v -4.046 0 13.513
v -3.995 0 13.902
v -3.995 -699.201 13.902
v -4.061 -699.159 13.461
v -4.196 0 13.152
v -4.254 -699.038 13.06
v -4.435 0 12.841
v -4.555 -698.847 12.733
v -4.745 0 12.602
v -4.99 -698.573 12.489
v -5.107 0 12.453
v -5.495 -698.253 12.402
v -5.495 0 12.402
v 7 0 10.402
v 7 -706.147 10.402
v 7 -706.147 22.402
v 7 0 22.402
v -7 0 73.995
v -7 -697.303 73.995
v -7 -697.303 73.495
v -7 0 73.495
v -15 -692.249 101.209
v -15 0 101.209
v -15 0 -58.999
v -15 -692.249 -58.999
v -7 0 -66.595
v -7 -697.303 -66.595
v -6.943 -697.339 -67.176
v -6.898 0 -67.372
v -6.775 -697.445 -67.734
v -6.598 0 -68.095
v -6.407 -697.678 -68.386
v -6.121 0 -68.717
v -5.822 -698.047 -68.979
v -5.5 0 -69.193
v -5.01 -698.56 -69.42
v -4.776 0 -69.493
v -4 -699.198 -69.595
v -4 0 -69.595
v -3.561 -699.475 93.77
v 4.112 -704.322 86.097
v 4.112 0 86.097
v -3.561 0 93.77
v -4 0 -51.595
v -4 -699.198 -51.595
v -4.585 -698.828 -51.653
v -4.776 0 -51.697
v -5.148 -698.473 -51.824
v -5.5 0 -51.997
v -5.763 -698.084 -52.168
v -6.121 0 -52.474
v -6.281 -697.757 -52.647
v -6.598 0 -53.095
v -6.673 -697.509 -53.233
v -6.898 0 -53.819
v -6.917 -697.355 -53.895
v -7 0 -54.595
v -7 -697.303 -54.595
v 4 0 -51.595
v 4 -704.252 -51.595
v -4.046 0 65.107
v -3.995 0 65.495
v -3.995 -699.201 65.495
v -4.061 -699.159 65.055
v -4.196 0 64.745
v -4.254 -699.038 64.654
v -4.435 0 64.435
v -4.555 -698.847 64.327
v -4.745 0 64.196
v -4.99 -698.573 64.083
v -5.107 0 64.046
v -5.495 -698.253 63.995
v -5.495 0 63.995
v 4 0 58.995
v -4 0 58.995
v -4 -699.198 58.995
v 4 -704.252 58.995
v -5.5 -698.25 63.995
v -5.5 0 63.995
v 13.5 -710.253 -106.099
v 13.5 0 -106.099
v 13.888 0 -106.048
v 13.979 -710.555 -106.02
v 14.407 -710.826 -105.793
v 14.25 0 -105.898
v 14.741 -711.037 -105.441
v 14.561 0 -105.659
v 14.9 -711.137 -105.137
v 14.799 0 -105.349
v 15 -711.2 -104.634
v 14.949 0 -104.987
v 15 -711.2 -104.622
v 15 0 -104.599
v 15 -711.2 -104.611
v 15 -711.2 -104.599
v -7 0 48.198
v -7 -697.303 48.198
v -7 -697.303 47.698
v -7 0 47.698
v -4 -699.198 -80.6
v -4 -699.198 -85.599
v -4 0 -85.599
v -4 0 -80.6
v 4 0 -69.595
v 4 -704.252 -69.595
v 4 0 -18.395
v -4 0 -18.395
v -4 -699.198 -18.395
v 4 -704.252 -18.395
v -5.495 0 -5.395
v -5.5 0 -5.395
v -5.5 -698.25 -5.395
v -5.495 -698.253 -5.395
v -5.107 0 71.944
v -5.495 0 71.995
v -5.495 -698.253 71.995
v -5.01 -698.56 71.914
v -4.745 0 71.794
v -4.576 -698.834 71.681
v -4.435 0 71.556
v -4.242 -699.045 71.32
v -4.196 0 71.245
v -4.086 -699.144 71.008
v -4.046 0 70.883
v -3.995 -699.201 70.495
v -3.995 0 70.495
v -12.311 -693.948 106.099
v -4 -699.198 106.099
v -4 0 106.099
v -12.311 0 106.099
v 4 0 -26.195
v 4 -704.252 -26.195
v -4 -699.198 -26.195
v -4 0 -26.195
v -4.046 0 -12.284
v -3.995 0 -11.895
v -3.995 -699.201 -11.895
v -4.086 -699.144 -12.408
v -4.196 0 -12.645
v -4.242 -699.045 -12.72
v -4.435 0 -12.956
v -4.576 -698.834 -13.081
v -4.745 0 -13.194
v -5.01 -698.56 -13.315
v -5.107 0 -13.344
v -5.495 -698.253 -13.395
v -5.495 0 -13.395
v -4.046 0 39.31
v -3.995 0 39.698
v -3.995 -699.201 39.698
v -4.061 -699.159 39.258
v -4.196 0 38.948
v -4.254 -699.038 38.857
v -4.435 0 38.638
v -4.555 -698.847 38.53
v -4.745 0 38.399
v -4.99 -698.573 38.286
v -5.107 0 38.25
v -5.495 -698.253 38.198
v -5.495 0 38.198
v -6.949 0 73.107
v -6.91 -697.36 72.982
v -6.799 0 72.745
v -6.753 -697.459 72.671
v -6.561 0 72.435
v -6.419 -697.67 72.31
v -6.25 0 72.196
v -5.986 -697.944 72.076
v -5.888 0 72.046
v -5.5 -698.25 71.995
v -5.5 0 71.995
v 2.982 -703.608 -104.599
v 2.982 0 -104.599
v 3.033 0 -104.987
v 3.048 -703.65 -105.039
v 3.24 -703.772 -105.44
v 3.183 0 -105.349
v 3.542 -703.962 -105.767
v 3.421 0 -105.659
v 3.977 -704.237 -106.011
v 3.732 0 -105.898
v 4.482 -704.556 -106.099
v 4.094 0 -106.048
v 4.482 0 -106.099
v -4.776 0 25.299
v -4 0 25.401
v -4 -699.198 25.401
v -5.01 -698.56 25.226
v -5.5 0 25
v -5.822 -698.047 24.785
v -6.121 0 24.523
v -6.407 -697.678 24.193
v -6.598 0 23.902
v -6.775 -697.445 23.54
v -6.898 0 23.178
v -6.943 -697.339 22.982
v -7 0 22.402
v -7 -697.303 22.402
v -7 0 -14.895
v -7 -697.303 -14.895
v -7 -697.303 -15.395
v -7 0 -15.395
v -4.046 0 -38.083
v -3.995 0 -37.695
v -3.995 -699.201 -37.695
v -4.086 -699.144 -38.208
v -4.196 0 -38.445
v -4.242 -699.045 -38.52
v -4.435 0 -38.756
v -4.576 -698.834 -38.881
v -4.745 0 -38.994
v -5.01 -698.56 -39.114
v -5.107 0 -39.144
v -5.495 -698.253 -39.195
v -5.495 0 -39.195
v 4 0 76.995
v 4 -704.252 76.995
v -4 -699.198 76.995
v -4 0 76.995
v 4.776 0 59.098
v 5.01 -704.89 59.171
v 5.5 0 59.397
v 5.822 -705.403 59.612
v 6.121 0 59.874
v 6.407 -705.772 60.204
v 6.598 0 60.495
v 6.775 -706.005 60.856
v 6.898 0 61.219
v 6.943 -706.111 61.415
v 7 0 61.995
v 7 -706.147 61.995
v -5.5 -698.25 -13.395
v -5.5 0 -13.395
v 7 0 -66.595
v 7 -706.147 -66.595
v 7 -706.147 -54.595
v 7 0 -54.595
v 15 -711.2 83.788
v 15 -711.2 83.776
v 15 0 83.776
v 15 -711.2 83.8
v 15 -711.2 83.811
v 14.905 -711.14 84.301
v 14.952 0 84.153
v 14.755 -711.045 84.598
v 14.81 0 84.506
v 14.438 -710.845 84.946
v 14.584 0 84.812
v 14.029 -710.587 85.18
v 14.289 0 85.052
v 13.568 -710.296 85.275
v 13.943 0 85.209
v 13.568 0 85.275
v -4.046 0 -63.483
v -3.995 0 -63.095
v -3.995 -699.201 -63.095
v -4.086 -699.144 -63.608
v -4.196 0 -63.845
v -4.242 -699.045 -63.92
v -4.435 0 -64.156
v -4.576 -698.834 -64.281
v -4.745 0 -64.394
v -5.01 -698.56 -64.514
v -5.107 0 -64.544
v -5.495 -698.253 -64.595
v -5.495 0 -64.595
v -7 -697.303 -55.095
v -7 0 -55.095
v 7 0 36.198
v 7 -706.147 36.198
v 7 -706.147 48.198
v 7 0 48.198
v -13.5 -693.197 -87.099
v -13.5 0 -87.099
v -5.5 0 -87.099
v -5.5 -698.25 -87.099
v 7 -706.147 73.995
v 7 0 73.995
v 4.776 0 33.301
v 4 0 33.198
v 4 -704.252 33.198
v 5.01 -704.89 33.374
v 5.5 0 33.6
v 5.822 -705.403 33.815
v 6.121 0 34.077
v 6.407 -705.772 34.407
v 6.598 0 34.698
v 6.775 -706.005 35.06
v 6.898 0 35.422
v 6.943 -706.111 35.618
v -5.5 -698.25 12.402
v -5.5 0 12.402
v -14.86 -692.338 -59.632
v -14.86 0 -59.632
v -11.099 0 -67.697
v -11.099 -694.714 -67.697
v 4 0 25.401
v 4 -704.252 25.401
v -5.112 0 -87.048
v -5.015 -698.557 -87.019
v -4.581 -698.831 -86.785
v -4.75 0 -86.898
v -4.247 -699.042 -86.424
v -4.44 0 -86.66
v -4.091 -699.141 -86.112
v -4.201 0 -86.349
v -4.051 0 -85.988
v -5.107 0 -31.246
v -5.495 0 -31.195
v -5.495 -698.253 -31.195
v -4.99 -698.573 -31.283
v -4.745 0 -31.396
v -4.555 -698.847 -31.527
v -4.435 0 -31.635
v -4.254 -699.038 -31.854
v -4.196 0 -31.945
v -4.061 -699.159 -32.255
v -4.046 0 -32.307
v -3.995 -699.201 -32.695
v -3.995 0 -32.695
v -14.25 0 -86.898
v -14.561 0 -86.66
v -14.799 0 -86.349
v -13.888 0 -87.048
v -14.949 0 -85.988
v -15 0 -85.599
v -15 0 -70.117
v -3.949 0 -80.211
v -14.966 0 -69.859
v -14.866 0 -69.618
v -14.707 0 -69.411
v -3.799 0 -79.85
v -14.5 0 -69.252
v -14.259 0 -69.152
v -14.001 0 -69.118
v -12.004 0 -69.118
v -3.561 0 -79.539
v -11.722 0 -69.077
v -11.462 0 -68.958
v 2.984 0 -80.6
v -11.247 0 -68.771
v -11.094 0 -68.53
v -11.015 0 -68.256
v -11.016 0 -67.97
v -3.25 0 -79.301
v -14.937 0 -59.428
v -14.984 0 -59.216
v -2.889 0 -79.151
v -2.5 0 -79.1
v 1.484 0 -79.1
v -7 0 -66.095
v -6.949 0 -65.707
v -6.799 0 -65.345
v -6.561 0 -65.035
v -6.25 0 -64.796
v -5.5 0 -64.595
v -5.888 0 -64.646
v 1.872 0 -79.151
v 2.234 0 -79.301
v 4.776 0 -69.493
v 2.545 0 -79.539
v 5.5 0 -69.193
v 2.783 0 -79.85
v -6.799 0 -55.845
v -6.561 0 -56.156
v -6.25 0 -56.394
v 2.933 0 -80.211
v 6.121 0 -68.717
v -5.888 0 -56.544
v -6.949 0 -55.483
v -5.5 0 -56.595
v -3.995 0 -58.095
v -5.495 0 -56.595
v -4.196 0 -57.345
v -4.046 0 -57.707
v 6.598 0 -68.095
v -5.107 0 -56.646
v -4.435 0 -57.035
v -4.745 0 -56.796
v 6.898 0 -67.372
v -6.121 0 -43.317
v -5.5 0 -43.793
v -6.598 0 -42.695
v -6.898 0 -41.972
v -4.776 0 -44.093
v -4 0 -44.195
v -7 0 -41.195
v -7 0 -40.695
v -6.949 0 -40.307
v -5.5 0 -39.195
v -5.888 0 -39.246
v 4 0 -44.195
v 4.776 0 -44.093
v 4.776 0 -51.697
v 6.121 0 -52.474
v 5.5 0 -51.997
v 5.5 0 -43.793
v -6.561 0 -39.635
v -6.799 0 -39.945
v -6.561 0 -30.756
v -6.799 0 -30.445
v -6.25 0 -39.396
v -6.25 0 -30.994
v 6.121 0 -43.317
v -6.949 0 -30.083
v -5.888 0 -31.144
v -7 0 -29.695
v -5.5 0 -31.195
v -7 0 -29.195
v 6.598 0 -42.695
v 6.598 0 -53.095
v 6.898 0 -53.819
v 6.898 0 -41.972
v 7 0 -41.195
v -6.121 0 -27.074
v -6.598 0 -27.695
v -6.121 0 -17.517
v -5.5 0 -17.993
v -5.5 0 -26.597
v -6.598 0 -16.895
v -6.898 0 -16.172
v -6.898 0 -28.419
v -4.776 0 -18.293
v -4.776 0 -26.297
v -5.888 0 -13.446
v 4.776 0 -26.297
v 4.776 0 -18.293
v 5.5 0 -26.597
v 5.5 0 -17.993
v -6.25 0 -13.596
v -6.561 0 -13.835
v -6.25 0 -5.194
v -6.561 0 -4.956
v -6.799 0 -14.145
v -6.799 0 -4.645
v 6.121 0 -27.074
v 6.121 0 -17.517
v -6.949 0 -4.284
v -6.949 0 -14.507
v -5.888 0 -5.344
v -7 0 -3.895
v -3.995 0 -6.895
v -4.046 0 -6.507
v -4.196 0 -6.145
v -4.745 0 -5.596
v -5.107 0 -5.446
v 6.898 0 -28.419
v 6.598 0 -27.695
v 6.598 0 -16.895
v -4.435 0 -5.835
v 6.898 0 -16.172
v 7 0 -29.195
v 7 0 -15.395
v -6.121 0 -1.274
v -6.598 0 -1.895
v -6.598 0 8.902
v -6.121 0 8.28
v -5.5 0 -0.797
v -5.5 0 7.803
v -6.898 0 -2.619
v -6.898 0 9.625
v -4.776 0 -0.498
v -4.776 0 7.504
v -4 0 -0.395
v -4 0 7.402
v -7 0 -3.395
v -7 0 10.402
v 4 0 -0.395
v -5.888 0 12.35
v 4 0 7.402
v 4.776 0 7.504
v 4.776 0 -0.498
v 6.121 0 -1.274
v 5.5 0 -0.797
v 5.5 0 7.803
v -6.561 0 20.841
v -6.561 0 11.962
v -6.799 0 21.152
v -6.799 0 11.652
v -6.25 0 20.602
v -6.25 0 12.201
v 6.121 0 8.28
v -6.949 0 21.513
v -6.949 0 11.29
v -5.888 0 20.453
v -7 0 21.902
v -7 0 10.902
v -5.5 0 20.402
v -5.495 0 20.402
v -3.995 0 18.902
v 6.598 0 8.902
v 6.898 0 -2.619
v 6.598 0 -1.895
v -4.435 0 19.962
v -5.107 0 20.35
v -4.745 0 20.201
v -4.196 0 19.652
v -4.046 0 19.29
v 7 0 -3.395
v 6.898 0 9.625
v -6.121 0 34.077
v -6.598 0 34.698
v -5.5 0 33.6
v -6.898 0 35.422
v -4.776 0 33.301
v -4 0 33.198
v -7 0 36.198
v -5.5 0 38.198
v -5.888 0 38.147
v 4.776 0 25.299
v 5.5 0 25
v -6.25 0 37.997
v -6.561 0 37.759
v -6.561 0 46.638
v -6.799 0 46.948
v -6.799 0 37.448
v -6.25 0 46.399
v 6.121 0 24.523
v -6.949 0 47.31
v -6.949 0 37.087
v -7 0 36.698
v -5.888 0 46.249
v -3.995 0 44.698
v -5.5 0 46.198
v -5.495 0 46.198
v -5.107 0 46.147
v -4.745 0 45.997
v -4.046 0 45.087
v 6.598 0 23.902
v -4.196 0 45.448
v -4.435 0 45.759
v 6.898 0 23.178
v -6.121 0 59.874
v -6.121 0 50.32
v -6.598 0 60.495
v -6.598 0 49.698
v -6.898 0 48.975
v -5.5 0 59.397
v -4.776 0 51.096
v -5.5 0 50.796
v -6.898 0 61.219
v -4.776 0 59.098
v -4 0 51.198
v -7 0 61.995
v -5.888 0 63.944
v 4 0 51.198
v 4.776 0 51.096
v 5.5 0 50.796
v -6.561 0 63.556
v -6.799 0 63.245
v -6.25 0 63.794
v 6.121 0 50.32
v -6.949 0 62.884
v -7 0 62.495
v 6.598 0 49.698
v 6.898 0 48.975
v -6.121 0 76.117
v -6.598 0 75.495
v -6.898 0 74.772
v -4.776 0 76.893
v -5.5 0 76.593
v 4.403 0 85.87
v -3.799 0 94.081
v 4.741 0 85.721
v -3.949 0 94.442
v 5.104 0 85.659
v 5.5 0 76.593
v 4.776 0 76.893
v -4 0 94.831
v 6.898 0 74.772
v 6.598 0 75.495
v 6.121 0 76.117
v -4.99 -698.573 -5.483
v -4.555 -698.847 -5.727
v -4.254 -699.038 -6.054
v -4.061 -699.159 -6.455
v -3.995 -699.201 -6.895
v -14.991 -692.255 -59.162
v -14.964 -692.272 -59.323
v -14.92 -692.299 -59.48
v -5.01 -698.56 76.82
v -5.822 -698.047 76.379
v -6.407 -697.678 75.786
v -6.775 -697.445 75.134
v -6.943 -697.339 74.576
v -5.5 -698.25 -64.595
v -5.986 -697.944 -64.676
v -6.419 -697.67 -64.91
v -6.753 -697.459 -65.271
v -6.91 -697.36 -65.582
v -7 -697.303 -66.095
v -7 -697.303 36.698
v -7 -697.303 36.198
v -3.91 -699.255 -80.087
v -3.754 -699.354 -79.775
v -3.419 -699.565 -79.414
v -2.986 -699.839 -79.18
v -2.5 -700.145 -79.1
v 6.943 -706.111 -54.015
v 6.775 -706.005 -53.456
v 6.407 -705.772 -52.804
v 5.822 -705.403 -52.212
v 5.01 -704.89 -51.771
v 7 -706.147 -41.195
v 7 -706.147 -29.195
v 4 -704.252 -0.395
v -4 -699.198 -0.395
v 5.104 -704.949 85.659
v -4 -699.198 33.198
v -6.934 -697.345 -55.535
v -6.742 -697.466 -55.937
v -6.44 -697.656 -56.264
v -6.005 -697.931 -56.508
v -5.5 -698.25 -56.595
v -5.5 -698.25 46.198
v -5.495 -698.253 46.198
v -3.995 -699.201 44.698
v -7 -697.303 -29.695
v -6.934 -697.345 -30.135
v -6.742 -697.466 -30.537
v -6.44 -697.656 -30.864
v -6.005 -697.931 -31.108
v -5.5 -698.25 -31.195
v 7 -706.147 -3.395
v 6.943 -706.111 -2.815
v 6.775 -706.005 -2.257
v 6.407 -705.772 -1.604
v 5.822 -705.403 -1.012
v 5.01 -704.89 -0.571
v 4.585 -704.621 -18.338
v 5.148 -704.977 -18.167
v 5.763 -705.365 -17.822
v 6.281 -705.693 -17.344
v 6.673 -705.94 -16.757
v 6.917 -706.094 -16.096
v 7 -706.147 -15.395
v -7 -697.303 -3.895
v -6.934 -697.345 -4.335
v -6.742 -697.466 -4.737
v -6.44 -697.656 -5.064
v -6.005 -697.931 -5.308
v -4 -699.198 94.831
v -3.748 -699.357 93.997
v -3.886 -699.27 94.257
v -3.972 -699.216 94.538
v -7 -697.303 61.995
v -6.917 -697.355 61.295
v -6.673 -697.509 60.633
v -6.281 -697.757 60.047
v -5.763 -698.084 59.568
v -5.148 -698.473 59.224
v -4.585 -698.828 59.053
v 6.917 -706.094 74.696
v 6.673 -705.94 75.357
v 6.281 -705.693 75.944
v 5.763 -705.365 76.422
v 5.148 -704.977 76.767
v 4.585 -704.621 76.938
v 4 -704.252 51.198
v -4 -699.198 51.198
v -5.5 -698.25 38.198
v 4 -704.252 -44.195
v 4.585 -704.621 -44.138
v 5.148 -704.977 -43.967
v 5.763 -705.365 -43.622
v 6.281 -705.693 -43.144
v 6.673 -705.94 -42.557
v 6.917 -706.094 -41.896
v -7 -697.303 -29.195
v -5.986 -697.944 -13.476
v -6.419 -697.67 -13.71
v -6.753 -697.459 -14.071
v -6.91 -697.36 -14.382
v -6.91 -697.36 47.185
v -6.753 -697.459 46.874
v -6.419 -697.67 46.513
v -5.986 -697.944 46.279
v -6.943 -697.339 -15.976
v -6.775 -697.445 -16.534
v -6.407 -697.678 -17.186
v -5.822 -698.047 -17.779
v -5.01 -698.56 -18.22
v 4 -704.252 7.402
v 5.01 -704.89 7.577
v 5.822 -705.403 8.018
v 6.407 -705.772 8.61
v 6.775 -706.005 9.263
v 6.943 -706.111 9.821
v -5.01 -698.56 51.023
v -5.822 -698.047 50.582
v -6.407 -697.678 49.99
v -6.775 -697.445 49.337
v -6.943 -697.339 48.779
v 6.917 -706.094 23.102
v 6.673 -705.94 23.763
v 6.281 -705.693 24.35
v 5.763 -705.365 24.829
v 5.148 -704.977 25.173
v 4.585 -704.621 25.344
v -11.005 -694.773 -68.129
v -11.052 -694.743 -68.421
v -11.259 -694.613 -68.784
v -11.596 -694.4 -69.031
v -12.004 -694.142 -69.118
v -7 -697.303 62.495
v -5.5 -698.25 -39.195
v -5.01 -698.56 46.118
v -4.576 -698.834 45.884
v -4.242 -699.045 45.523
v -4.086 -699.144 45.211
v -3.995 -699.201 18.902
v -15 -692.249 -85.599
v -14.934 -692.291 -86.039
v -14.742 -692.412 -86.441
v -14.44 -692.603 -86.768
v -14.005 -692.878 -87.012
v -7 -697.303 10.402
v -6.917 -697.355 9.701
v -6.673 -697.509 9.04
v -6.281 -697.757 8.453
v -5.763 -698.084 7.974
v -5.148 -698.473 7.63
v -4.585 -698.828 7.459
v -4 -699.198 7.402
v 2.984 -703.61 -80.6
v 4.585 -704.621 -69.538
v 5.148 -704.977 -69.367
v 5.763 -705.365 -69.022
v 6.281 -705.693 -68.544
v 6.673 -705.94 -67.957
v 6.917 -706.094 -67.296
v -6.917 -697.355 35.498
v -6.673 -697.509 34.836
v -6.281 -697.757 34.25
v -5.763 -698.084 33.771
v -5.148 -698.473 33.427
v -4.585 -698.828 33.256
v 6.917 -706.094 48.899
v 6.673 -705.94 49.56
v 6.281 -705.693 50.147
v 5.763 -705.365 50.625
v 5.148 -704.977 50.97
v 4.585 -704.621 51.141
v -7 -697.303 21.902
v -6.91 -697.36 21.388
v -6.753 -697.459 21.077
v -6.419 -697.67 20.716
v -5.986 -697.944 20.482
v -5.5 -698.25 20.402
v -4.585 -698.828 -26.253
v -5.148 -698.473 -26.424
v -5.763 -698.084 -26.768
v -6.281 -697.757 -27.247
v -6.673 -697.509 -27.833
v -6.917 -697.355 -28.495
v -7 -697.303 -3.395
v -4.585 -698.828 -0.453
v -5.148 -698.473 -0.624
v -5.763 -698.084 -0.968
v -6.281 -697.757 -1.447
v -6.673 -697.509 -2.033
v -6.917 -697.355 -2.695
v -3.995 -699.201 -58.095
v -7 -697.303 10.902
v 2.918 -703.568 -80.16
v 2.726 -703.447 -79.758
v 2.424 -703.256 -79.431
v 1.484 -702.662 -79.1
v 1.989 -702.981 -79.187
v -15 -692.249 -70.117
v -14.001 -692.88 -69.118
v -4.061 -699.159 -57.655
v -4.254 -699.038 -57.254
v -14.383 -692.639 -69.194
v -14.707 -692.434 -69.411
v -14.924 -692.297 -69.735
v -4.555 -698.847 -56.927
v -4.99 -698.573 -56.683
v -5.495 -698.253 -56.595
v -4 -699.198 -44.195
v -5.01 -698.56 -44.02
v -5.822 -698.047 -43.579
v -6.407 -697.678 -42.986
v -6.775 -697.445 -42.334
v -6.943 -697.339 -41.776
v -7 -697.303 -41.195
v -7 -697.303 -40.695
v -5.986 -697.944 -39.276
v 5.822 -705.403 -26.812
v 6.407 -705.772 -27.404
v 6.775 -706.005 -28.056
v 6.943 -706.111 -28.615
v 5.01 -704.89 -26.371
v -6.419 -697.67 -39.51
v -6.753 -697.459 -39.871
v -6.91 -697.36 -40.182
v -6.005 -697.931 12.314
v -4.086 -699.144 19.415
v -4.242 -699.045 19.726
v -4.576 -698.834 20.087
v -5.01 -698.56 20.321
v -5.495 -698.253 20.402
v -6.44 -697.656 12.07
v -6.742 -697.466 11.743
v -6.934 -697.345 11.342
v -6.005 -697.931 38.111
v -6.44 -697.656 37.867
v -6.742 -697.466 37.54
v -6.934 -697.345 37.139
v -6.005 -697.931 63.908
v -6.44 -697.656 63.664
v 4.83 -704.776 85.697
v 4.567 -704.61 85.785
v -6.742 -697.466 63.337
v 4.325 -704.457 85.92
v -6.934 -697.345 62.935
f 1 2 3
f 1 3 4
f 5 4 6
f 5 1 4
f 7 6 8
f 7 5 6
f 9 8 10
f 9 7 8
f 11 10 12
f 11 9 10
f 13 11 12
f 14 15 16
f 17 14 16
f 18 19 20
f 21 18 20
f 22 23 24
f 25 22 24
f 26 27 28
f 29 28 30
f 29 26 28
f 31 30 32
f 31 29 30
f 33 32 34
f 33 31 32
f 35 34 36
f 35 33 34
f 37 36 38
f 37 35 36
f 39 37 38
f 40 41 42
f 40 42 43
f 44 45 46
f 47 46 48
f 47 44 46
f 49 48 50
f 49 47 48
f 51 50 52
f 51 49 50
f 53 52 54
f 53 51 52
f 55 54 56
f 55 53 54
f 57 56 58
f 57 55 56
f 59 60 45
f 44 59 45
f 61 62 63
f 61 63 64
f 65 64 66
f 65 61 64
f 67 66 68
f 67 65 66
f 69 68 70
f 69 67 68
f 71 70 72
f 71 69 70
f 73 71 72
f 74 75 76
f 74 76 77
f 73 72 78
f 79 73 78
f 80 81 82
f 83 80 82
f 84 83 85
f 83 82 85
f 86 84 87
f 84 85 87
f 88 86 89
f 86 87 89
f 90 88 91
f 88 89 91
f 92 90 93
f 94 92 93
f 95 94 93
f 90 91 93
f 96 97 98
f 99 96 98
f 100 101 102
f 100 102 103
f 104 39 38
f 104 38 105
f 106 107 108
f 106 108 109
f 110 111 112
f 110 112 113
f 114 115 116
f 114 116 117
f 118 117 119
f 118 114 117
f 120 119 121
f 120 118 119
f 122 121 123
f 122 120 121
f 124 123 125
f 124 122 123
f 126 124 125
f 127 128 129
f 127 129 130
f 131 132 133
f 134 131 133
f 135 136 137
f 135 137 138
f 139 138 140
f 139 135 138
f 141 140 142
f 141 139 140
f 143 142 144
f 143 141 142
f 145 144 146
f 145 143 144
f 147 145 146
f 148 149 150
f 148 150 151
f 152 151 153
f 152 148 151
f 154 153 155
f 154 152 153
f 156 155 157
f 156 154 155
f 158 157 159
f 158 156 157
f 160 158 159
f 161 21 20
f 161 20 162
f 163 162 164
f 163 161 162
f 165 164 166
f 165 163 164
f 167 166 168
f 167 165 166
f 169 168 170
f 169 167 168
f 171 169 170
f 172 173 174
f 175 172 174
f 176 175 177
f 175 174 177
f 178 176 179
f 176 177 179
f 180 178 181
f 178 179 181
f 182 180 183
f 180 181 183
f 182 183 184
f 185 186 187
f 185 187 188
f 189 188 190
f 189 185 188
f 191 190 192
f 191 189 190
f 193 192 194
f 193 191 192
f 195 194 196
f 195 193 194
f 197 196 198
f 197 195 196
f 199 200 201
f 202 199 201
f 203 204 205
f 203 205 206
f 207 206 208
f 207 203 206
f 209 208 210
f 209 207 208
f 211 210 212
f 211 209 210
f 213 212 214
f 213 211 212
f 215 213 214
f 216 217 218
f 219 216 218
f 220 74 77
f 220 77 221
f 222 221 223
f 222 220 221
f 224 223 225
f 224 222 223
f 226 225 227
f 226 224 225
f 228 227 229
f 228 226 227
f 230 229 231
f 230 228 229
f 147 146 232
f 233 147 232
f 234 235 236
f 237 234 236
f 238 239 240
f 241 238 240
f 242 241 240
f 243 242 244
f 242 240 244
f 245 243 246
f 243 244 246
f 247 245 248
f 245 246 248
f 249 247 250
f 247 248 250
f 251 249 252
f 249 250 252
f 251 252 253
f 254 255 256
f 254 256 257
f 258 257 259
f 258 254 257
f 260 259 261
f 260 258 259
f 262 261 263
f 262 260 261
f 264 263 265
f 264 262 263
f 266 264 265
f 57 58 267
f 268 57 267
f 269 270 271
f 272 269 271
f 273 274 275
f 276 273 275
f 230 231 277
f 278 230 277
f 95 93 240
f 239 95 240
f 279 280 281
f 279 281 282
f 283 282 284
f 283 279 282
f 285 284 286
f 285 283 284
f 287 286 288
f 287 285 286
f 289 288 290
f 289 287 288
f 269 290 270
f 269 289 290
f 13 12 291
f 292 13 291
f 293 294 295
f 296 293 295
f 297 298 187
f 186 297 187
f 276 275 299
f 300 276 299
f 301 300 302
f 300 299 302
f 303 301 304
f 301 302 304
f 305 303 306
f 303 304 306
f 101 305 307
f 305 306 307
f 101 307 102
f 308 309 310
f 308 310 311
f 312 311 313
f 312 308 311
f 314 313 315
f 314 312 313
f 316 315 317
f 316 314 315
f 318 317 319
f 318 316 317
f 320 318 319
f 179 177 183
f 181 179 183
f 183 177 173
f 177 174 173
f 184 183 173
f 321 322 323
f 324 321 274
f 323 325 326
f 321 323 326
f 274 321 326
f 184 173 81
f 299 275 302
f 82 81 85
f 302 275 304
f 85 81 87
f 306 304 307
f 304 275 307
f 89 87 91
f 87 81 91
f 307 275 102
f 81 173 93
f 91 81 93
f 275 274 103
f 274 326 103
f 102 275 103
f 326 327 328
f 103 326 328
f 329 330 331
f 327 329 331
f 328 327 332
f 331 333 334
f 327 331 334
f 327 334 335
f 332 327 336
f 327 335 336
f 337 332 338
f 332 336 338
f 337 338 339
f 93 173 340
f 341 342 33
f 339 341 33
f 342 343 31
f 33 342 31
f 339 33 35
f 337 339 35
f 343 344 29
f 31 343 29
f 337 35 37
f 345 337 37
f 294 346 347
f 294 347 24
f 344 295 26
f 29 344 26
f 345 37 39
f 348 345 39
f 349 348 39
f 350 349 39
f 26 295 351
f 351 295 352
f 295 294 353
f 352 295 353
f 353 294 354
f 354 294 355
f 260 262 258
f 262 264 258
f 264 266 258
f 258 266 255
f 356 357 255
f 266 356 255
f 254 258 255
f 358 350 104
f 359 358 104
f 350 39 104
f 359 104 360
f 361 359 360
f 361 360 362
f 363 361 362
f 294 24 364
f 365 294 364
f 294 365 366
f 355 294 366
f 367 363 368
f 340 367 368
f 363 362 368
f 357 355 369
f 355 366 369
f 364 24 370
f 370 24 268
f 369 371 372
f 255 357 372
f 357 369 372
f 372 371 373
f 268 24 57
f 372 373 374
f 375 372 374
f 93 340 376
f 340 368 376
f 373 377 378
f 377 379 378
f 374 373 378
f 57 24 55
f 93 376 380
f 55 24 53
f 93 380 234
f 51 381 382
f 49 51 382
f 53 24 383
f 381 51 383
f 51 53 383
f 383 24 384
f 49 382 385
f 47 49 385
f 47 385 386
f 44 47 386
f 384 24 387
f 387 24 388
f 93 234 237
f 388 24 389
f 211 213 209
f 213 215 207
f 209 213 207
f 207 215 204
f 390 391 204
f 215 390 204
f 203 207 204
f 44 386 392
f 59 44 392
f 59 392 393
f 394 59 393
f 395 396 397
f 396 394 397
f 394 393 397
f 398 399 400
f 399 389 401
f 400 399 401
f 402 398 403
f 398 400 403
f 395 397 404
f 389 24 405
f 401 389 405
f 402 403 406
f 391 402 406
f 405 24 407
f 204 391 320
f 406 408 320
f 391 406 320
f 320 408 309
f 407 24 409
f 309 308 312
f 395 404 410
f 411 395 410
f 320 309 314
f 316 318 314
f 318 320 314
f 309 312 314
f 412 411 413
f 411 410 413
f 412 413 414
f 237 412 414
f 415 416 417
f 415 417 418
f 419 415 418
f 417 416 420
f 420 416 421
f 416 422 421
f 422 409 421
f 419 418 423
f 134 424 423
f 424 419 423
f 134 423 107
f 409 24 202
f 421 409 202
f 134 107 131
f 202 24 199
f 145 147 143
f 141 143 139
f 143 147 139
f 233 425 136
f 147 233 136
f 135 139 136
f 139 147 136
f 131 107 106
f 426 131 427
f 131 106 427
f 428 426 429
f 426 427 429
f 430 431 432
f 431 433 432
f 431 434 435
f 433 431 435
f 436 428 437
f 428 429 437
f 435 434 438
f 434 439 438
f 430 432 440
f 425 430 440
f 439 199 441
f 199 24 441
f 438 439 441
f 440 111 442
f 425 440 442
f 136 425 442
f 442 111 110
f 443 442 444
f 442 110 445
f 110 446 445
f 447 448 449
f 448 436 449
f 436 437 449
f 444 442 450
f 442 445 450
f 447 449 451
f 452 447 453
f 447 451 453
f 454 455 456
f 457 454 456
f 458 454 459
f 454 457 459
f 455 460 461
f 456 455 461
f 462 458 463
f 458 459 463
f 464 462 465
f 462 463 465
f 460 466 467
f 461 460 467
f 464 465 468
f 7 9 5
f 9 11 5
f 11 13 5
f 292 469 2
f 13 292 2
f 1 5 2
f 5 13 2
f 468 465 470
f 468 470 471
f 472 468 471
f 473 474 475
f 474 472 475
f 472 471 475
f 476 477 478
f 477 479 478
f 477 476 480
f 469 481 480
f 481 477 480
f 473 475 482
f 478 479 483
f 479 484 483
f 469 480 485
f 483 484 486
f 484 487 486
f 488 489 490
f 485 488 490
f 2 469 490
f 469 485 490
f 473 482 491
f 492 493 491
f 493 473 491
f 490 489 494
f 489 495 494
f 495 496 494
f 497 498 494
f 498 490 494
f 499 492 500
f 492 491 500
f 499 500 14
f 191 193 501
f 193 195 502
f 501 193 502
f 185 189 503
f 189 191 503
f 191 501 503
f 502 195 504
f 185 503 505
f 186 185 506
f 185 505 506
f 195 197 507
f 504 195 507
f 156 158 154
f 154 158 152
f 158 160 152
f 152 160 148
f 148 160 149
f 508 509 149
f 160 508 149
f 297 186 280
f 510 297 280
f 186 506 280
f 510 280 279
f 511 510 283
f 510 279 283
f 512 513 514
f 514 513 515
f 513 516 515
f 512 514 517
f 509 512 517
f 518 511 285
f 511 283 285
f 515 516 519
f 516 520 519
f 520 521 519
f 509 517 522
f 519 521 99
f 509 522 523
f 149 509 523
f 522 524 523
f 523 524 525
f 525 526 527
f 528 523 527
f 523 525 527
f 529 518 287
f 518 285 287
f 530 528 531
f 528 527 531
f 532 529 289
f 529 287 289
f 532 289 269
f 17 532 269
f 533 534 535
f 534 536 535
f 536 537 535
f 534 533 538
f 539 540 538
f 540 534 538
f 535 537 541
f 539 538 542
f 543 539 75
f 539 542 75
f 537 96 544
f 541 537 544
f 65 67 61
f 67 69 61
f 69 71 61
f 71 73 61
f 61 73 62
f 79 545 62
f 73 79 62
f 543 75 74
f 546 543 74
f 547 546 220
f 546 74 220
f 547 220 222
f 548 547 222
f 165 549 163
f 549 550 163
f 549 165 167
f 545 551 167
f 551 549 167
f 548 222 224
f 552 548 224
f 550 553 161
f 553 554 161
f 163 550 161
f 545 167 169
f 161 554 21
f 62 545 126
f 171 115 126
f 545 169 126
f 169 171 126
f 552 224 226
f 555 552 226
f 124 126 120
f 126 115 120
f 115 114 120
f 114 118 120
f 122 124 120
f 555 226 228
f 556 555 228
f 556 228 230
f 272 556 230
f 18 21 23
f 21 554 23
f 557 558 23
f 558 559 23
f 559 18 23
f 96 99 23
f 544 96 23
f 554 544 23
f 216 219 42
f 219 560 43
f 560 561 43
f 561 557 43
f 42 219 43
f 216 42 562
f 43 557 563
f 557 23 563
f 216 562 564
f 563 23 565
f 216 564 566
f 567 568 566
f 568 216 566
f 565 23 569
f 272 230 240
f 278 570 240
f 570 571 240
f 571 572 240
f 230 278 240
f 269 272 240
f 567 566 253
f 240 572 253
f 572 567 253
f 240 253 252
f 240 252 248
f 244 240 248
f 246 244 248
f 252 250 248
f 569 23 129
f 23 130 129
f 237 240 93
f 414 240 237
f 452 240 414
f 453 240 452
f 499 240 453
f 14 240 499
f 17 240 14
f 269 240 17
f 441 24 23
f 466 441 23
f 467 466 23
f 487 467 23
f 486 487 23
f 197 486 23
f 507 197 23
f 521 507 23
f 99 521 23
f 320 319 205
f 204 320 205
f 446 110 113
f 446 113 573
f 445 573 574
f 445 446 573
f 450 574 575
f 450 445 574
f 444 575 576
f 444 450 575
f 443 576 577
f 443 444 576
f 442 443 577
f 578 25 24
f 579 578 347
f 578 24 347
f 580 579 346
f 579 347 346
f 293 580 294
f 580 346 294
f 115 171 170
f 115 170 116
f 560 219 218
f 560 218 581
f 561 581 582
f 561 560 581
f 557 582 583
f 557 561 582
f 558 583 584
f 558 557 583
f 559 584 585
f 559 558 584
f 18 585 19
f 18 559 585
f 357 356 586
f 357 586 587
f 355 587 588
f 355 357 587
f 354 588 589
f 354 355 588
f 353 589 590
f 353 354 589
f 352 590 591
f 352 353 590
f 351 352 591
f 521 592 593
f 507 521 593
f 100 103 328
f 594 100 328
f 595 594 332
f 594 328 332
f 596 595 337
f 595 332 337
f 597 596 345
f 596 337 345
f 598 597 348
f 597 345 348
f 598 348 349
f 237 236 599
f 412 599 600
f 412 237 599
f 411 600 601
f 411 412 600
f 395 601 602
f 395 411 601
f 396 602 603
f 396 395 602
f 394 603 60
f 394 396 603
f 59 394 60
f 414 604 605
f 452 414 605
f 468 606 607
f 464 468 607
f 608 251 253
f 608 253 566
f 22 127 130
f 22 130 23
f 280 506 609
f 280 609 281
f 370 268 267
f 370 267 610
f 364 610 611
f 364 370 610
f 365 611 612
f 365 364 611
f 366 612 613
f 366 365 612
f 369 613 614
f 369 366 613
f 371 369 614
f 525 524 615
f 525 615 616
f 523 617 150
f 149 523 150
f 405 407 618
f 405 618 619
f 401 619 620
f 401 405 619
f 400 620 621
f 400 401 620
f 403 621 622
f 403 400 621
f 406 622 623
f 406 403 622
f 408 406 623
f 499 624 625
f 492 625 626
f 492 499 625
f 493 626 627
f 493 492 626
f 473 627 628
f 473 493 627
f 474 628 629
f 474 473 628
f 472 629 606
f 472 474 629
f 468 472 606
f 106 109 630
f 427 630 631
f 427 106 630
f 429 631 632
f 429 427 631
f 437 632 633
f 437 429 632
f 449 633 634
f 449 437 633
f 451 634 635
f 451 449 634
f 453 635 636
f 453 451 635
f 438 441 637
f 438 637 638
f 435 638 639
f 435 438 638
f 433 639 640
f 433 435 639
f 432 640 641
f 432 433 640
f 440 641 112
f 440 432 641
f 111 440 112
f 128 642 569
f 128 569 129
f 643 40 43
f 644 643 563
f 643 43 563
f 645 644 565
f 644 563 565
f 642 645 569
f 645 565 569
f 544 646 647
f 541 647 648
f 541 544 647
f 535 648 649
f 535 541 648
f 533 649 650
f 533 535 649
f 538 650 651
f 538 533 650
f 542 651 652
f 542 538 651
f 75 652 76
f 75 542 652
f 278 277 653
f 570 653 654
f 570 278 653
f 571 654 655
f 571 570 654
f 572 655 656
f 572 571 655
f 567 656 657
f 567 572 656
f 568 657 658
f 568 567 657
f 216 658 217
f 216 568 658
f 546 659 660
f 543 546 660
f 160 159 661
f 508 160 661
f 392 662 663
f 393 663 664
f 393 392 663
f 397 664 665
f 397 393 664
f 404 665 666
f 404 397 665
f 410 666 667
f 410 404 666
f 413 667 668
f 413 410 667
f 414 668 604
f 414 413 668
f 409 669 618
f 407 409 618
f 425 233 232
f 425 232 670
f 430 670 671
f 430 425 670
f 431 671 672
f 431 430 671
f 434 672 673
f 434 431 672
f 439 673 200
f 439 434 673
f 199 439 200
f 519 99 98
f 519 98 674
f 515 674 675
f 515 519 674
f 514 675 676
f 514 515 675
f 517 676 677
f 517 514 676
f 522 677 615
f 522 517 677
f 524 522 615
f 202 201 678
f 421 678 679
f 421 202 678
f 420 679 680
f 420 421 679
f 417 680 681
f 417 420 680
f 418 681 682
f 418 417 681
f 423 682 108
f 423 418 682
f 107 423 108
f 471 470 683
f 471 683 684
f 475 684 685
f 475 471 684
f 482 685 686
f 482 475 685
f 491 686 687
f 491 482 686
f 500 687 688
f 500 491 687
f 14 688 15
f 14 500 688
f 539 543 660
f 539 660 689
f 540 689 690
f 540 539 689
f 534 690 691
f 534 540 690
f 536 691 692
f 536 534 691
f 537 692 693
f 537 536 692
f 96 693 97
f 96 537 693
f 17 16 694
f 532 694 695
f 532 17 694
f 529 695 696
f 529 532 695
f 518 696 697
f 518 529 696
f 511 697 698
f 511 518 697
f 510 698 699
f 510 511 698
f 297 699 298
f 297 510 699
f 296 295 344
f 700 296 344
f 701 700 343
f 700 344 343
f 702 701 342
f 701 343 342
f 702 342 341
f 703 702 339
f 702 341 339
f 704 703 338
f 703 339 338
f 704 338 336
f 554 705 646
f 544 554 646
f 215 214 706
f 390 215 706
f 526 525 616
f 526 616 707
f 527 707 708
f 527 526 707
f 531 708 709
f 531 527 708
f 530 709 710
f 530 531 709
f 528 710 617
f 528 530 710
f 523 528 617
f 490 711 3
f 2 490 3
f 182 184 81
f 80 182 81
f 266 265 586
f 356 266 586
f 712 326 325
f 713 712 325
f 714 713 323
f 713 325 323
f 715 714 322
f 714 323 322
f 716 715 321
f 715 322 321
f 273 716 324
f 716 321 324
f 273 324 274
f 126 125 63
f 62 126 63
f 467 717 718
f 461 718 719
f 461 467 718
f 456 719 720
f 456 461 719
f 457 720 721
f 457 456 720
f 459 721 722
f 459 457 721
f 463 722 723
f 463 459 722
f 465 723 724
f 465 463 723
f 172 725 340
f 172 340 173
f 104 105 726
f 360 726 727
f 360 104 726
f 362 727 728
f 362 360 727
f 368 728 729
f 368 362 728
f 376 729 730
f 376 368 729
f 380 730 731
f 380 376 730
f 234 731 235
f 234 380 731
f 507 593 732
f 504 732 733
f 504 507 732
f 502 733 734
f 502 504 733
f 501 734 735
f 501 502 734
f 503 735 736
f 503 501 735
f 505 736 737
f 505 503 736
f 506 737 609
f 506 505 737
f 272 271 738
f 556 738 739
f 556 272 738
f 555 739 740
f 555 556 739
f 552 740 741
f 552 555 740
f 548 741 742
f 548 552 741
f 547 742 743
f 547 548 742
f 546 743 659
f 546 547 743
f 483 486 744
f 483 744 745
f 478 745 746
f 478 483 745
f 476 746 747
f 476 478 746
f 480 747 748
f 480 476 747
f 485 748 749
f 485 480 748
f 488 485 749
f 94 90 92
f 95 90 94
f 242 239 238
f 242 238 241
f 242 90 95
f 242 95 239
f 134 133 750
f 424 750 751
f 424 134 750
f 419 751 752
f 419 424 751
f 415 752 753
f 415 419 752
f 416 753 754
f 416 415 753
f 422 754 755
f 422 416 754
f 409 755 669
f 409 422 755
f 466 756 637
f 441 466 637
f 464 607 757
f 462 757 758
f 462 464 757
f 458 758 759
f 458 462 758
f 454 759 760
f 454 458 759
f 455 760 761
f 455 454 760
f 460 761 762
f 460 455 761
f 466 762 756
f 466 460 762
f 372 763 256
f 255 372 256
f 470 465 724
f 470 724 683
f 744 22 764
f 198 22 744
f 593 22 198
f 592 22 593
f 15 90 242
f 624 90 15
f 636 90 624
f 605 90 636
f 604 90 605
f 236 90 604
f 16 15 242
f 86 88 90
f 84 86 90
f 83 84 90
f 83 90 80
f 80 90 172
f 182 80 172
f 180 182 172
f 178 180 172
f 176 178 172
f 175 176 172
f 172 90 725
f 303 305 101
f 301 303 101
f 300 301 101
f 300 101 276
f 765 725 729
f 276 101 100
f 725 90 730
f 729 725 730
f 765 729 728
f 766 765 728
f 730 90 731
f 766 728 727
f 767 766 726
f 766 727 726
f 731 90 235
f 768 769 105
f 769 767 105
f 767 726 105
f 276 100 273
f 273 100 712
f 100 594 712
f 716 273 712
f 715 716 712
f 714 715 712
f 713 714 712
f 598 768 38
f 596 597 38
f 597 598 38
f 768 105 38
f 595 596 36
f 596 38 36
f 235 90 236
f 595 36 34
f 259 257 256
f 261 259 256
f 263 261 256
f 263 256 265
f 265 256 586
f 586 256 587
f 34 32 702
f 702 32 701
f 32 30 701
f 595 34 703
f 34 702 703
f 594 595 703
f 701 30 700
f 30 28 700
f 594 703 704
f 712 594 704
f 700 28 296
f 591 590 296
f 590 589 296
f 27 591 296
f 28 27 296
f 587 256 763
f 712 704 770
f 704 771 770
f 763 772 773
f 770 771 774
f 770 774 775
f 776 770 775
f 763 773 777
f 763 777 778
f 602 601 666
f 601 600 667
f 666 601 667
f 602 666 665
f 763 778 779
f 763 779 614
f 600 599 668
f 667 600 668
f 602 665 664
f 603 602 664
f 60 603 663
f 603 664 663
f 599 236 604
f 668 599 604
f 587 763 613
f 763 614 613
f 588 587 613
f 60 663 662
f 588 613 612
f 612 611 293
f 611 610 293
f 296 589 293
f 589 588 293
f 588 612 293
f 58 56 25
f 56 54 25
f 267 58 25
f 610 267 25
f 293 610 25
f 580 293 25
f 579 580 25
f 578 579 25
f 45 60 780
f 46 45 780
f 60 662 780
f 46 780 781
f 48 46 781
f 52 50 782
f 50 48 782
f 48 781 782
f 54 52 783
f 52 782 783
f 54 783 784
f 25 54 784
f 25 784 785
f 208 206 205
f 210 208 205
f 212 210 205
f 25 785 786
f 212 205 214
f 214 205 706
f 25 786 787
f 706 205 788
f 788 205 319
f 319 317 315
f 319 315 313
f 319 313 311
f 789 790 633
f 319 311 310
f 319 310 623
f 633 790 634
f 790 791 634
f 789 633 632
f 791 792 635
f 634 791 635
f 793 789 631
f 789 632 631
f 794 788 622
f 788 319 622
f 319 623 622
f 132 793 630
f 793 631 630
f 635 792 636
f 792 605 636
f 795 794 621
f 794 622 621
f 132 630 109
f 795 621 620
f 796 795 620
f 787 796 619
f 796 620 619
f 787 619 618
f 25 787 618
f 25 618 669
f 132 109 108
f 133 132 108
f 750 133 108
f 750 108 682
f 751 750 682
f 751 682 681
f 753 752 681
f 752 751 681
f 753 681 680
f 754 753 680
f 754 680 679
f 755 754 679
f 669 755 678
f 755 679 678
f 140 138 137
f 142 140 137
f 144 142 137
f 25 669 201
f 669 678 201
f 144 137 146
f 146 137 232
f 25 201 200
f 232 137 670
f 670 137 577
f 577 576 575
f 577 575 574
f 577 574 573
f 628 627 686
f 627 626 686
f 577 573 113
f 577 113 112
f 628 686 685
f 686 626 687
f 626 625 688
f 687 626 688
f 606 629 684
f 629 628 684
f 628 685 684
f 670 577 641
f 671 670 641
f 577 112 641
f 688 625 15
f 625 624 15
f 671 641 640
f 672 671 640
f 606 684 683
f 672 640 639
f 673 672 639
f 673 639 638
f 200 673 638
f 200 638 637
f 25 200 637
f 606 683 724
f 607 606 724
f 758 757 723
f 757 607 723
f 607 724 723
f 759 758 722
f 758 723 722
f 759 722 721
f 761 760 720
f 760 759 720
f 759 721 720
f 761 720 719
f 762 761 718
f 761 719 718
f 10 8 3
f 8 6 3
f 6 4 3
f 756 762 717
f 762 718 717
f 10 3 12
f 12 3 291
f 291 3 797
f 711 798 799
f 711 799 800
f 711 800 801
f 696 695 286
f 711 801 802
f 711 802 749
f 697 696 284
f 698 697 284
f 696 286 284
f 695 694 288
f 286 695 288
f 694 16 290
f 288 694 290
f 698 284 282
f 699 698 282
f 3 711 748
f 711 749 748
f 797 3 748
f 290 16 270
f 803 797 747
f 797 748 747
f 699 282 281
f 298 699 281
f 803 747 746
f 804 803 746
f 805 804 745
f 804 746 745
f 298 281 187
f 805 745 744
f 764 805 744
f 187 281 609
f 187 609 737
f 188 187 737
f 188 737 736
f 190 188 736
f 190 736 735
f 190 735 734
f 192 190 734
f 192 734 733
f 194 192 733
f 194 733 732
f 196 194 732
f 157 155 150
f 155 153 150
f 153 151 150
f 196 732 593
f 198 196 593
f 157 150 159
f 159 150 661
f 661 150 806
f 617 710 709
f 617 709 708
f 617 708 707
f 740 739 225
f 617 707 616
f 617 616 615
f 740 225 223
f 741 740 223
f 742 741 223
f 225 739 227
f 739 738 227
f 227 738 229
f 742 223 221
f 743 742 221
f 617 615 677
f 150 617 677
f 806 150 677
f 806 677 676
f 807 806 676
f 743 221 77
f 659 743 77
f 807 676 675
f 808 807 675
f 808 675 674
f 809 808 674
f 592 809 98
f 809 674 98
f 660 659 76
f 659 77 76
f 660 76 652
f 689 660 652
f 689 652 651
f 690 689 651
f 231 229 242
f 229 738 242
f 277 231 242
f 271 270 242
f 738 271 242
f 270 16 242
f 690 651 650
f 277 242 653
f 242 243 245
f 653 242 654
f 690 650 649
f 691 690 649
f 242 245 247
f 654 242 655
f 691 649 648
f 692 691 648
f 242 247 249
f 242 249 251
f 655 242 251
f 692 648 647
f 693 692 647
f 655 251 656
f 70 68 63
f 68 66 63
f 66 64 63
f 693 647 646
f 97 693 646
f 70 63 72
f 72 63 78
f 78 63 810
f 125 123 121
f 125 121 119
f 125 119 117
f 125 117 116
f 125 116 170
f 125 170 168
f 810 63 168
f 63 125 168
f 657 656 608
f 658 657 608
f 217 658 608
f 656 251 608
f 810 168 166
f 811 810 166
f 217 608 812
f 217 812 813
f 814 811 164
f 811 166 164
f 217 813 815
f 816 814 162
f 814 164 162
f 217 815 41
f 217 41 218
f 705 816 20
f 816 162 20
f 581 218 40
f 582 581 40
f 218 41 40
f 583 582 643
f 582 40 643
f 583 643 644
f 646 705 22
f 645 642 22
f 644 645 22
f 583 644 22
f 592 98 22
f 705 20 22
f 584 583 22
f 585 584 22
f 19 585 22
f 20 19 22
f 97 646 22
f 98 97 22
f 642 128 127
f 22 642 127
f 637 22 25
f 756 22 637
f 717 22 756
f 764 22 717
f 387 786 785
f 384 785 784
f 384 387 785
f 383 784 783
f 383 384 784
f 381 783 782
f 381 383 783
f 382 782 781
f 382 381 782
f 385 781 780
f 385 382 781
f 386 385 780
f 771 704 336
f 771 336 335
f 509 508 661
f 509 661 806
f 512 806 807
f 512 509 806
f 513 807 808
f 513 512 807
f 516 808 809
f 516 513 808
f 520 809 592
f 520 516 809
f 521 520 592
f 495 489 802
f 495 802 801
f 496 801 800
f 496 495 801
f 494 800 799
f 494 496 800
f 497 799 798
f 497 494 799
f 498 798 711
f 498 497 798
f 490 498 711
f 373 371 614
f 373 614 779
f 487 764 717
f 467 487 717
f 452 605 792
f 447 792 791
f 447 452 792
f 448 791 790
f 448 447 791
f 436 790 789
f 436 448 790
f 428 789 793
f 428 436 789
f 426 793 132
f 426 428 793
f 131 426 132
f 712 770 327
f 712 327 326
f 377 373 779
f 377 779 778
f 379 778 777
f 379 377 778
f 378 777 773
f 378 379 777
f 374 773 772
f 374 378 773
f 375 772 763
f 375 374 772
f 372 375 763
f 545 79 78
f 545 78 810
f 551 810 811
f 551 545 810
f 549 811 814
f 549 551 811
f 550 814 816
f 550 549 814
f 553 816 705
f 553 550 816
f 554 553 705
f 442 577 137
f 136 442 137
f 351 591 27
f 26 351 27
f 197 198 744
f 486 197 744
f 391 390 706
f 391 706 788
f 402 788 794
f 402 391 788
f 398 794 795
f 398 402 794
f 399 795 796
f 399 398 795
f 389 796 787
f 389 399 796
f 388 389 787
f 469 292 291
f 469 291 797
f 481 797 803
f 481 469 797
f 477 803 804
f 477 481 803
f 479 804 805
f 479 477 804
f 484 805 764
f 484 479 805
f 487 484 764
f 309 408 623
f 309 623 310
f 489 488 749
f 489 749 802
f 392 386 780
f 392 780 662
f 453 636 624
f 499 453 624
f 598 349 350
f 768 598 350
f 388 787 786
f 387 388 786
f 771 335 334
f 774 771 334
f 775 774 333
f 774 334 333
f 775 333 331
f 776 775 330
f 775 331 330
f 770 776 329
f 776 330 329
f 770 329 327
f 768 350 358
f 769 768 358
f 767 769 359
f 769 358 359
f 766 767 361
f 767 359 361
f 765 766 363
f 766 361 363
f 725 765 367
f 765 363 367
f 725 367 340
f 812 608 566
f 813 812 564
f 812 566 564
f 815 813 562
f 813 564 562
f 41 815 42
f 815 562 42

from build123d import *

# Parameters (mm, degrees)
F1_DEPTH      = 711.2
F3_DEPTH      = 711.2
F5_DEPTH      = 106.0997464
F5_DEPTH_BACK = 106.0997464


# Not quite as in the source:
# - ends of sketch curves that miss each other by under 0.0002 mm in the source are joined


with BuildPart() as f1:
    # F0 (on Front) → F1 (new body)
    with BuildSketch(Plane.XZ):
        with BuildLine():
            ThreePointArc((-14.9999680608, -58.9985104), (-14.96444377, -59.322873513), (-14.8595551032, -59.6318585804))
            Line((-14.8595551032, -59.6318585804), (-11.0988328608, -67.6967912))
            ThreePointArc((-11.0988328608, -67.6967912), (-11.1617050028, -68.655791158), (-12.004294, -69.1180454046))
            Line((-12.004294, -69.1180454046), (-14.0009118, -69.1180736))
            ThreePointArc((-14.0009118, -69.1180736), (-14.707352628, -69.410690972), (-14.99997, -70.1171318))
            Line((-14.99997, -70.1171318), (-14.99997, -85.599397))
            ThreePointArc((-14.99997, -85.599397), (-14.5606310505, -86.6600550505), (-13.499973, -87.099394))
            Line((-13.499973, -87.099394), (-5.5003446, -87.099394))
            ThreePointArc((-5.5003446, -87.099394), (-4.4396865495, -86.6600550505), (-4.0003476, -85.599397))
            Line((-4.0003476, -85.599397), (-4.0003476, -80.5996356))
            ThreePointArc((-4.0003476, -80.5996356), (-3.5610086505, -79.5389775495), (-2.5003506, -79.0996386))
            Line((-2.5003506, -79.0996386), (1.4838426, -79.0996386))
            ThreePointArc((1.4838426, -79.0996386), (2.5445365709, -79.5390134712), (2.9838395966, -80.5997372))
            Line((2.9838395966, -80.5997372), (2.98196, -104.5986224))
            ThreePointArc((2.98196, -104.5986224), (3.4212540492, -105.6593625482), (4.481957, -106.0987464))
            Line((4.481957, -106.0987464), (13.499973, -106.0987464))
            ThreePointArc((13.499973, -106.0987464), (14.5606310505, -105.6594074505), (14.99997, -104.5987494))
            Line((14.99997, -104.5987494), (14.99997, 83.7761342))
            ThreePointArc((14.99997, 83.7761342), (14.5844487053, 84.8124273268), (13.5680958768, 85.2745834897))
            Line((13.5680958768, 85.2745834897), (5.104384, 85.6592902))
            ThreePointArc((5.104384, 85.6592902), (4.5671403109, 85.7853117853), (4.1118233495, 86.0970797495))
            Line((4.1118233495, 86.0970797495), (-3.5610038, 93.7699166))
            ThreePointArc((-3.5610038, 93.7699166), (-3.8861671271, 94.2565457995), (-4.0003476, 94.8305698))
            Line((-4.0003476, 94.8305698), (-4.0003476, 106.0987464))
            Line((-4.0003476, 106.0987464), (-12.3105164, 106.0987464))
            Line((-12.3105164, 106.0987464), (-14.99997, 101.2086876))
            Line((-14.99997, 101.2086876), (-14.9999680608, -58.9985104))
        make_face()
    extrude(amount=F1_DEPTH)

    # F2 (on Front) → F3 (cut)
    with BuildSketch(Plane.XZ):
        with BuildLine():
            ThreePointArc((-5.49529, -31.195264), (-4.4346319495, -31.6346029495), (-3.995293, -32.695261))
            Line((-3.995293, -32.695261), (-3.995293, -37.695251))
            ThreePointArc((-3.995293, -37.695251), (-4.4346319495, -38.7559090505), (-5.49529, -39.195248))
            Line((-5.49529, -39.195248), (-5.499989, -39.195248))
            ThreePointArc((-5.499989, -39.195248), (-6.5606470505, -39.6345869495), (-6.999986, -40.695245))
            Line((-6.999986, -40.695245), (-6.999986, -41.195244))
            ThreePointArc((-6.999986, -41.195244), (-6.1213081009, -43.3165601009), (-3.999992, -44.195238))
            Line((-3.999992, -44.195238), (3.999992, -44.195238))
            ThreePointArc((3.999992, -44.195238), (6.1213081009, -43.3165601009), (6.999986, -41.195244))
            Line((6.999986, -41.195244), (6.999986, -29.195268))
            ThreePointArc((6.999986, -29.195268), (6.1213081009, -27.0739518991), (3.999992, -26.195274))
            Line((3.999992, -26.195274), (-3.999992, -26.195274))
            ThreePointArc((-3.999992, -26.195274), (-6.1213081009, -27.0739518991), (-6.999986, -29.195268))
            Line((-6.999986, -29.195268), (-6.999986, -29.695267))
            ThreePointArc((-6.999986, -29.695267), (-6.5606470505, -30.7559250505), (-5.499989, -31.195264))
            Line((-5.499989, -31.195264), (-5.49529, -31.195264))
        make_face()
        with BuildLine():
            ThreePointArc((-5.49529, -56.595264), (-4.4346319495, -57.0346029495), (-3.995293, -58.095261))
            Line((-3.995293, -58.095261), (-3.995293, -63.095251))
            ThreePointArc((-3.995293, -63.095251), (-4.4346319495, -64.1559090505), (-5.49529, -64.595248))
            Line((-5.49529, -64.595248), (-5.499989, -64.595248))
            ThreePointArc((-5.499989, -64.595248), (-6.5606470505, -65.0345869495), (-6.999986, -66.095245))
            Line((-6.999986, -66.095245), (-6.999986, -66.595244))
            ThreePointArc((-6.999986, -66.595244), (-6.1213081009, -68.7165601009), (-3.999992, -69.595238))
            Line((-3.999992, -69.595238), (0, -69.595238))
            Line((0, -69.595238), (3.999992, -69.595238))
            ThreePointArc((3.999992, -69.595238), (6.1213081009, -68.7165601009), (6.999986, -66.595244))
            Line((6.999986, -66.595244), (6.999986, -54.595268))
            ThreePointArc((6.999986, -54.595268), (6.1213081009, -52.4739518991), (3.999992, -51.595274))
            Line((3.999992, -51.595274), (-3.999992, -51.595274))
            ThreePointArc((-3.999992, -51.595274), (-6.1213081009, -52.4739518991), (-6.999986, -54.595268))
            Line((-6.999986, -54.595268), (-6.999986, -55.095267))
            ThreePointArc((-6.999986, -55.095267), (-6.5606470505, -56.1559250505), (-5.499989, -56.595264))
            Line((-5.499989, -56.595264), (-5.49529, -56.595264))
        make_face()
        with BuildLine():
            ThreePointArc((-5.49529, -5.3953664), (-4.4346319495, -5.8347053495), (-3.995293, -6.8953634))
            Line((-3.995293, -6.8953634), (-3.995293, -11.8953534))
            ThreePointArc((-3.995293, -11.8953534), (-4.4346319495, -12.9560114505), (-5.49529, -13.3953504))
            Line((-5.49529, -13.3953504), (-5.499989, -13.3953504))
            ThreePointArc((-5.499989, -13.3953504), (-6.5606470505, -13.8346893495), (-6.999986, -14.8953474))
            Line((-6.999986, -14.8953474), (-6.999986, -15.3953464))
            ThreePointArc((-6.999986, -15.3953464), (-6.1213081009, -17.5166625009), (-3.999992, -18.3953404))
            Line((-3.999992, -18.3953404), (3.999992, -18.3953404))
            ThreePointArc((3.999992, -18.3953404), (6.1213081009, -17.5166625009), (6.999986, -15.3953464))
            Line((6.999986, -15.3953464), (6.999986, -3.3953704))
            ThreePointArc((6.999986, -3.3953704), (6.1213081009, -1.2740542991), (3.999992, -0.3953764))
            Line((3.999992, -0.3953764), (-3.999992, -0.3953764))
            ThreePointArc((-3.999992, -0.3953764), (-6.1213081009, -1.2740542991), (-6.999986, -3.3953704))
            Line((-6.999986, -3.3953704), (-6.999986, -3.8953694))
            ThreePointArc((-6.999986, -3.8953694), (-6.5606470505, -4.9560274505), (-5.499989, -5.3953664))
            Line((-5.499989, -5.3953664), (-5.49529, -5.3953664))
        make_face()
        with BuildLine():
            Line((-5.499989, 20.4015086), (-5.49529, 20.4015086))
            ThreePointArc((-5.49529, 20.4015086), (-4.4346319495, 19.9621696505), (-3.995293, 18.9015116))
            Line((-3.995293, 18.9015116), (-3.995293, 13.9015216))
            ThreePointArc((-3.995293, 13.9015216), (-4.4346319495, 12.8408635495), (-5.49529, 12.4015246))
            Line((-5.49529, 12.4015246), (-5.499989, 12.4015246))
            ThreePointArc((-5.499989, 12.4015246), (-6.5606470505, 11.9621856505), (-6.999986, 10.9015276))
            Line((-6.999986, 10.9015276), (-6.999986, 10.4015286))
            ThreePointArc((-6.999986, 10.4015286), (-6.1213081009, 8.2802124991), (-3.999992, 7.4015346))
            Line((-3.999992, 7.4015346), (3.999992, 7.4015346))
            ThreePointArc((3.999992, 7.4015346), (6.1213081009, 8.2802124991), (6.999986, 10.4015286))
            Line((6.999986, 10.4015286), (6.999986, 22.4015046))
            ThreePointArc((6.999986, 22.4015046), (6.1213081009, 24.5228207009), (3.999992, 25.4014986))
            Line((3.999992, 25.4014986), (-3.999992, 25.4014986))
            ThreePointArc((-3.999992, 25.4014986), (-6.1213081009, 24.5228207009), (-6.999986, 22.4015046))
            Line((-6.999986, 22.4015046), (-6.999986, 21.9015056))
            ThreePointArc((-6.999986, 21.9015056), (-6.5606470505, 20.8408475495), (-5.499989, 20.4015086))
        make_face()
        with BuildLine():
            Line((-5.499989, 46.1983836), (-5.49529, 46.1983836))
            ThreePointArc((-5.49529, 46.1983836), (-4.4346319495, 45.7590446505), (-3.995293, 44.6983866))
            Line((-3.995293, 44.6983866), (-3.995293, 39.6983966))
            ThreePointArc((-3.995293, 39.6983966), (-4.4346319495, 38.6377385495), (-5.49529, 38.1983996))
            Line((-5.49529, 38.1983996), (-5.499989, 38.1983996))
            ThreePointArc((-5.499989, 38.1983996), (-6.5606470505, 37.7590606505), (-6.999986, 36.6984026))
            Line((-6.999986, 36.6984026), (-6.999986, 36.1984036))
            ThreePointArc((-6.999986, 36.1984036), (-6.1213081009, 34.0770874991), (-3.999992, 33.1984096))
            Line((-3.999992, 33.1984096), (3.999992, 33.1984096))
            ThreePointArc((3.999992, 33.1984096), (6.1213081009, 34.0770874991), (6.999986, 36.1984036))
            Line((6.999986, 36.1984036), (6.999986, 48.1983796))
            ThreePointArc((6.999986, 48.1983796), (6.1213081009, 50.3196957009), (3.999992, 51.1983736))
            Line((3.999992, 51.1983736), (-3.999992, 51.1983736))
            ThreePointArc((-3.999992, 51.1983736), (-6.1213081009, 50.3196957009), (-6.999986, 48.1983796))
            Line((-6.999986, 48.1983796), (-6.999986, 47.6983806))
            ThreePointArc((-6.999986, 47.6983806), (-6.5606470505, 46.6377225495), (-5.499989, 46.1983836))
        make_face()
        with BuildLine():
            Line((-5.499989, 71.9952586), (-5.49529, 71.9952586))
            ThreePointArc((-5.49529, 71.9952586), (-4.4346319495, 71.5559196505), (-3.995293, 70.4952616))
            Line((-3.995293, 70.4952616), (-3.995293, 65.4952716))
            ThreePointArc((-3.995293, 65.4952716), (-4.4346319495, 64.4346135495), (-5.49529, 63.9952746))
            Line((-5.49529, 63.9952746), (-5.499989, 63.9952746))
            ThreePointArc((-5.499989, 63.9952746), (-6.5606470505, 63.5559356505), (-6.999986, 62.4952776))
            Line((-6.999986, 62.4952776), (-6.999986, 61.9952786))
            ThreePointArc((-6.999986, 61.9952786), (-6.1213081009, 59.8739624991), (-3.999992, 58.9952846))
            Line((-3.999992, 58.9952846), (3.999992, 58.9952846))
            ThreePointArc((3.999992, 58.9952846), (6.1213081009, 59.8739624991), (6.999986, 61.9952786))
            Line((6.999986, 61.9952786), (6.999986, 73.9952546))
            ThreePointArc((6.999986, 73.9952546), (6.1213081009, 76.1165707009), (3.999992, 76.9952486))
            Line((3.999992, 76.9952486), (-3.999992, 76.9952486))
            ThreePointArc((-3.999992, 76.9952486), (-6.1213081009, 76.1165707009), (-6.999986, 73.9952546))
            Line((-6.999986, 73.9952546), (-6.999986, 73.4952556))
            ThreePointArc((-6.999986, 73.4952556), (-6.5606470505, 72.4345975495), (-5.499989, 71.9952586))
        make_face()
    extrude(amount=F3_DEPTH, mode=Mode.SUBTRACT)

    # F4 (on Top) → F5 (cut, two sides)
    with BuildSketch(Plane.XY) as f5_sk:
        Polygon((-15.0409955531, -711.2733125687), (15.1156112552, -711.2733125687), (-15.0409955531, -692.2233125687), align=None)
    extrude(amount=F5_DEPTH, mode=Mode.SUBTRACT)
    extrude(f5_sk.sketch, amount=-F5_DEPTH_BACK, mode=Mode.SUBTRACT)


solid = f1.part
